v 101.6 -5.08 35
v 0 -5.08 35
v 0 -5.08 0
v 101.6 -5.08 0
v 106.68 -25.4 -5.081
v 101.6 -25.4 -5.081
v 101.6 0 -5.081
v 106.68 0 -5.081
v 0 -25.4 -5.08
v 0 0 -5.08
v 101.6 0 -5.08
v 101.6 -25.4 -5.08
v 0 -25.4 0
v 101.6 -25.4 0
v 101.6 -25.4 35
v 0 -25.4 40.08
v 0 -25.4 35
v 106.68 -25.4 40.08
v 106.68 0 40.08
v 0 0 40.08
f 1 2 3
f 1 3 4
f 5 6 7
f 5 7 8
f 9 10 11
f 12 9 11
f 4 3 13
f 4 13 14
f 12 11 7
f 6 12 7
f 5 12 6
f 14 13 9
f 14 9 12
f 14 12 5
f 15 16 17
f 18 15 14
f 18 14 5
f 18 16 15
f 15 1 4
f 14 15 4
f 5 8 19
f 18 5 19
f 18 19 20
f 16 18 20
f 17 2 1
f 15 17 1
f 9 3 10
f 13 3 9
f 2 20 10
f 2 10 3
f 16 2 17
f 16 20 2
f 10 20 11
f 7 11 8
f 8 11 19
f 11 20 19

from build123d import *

# Parameters (mm, degrees)
F0_W      = 101.6
F0_H      = 5.08
F1_DEPTH  = 25.4
F0_H_2    = 35
F2_DEPTH  = 5.08
F1_FACE_W = 25.4
F1_FACE_H = 45.1612
F3_DEPTH  = 5.08


with BuildPart() as f1:
    # F0 (on Front) → F1 (new body)
    with BuildSketch(Plane.XZ):
        Polygon((0, -5.08), (0, 0), (0, 35), (0, 40.08), (-5.08, 40.08), (-5.08, -5.0812), (0, -5.0812), align=None)
        with Locations((50.8, -2.54)):
            Rectangle(F0_W, F0_H)
        Polygon((101.6, 35), (101.6, 0), (101.6, -5.08), (101.6, -5.0812), (106.68, -5.0812), (106.68, 40.08), (101.6, 40.08), align=None)
        with Locations((50.8, 37.54)):
            Rectangle(F0_W, F0_H)
    extrude(amount=F1_DEPTH)

    # F0 (on Front) → F2 (join)
    with BuildSketch(Plane.XZ):
        with Locations((50.8, 17.5)):
            Rectangle(F0_W, F0_H_2)
    extrude(amount=F2_DEPTH)

    # F1_face (on face) → F3 (cut)
    with BuildSketch(Plane(origin=(-5.08, -12.7, 17.4994), x_dir=(0, -1, 0), z_dir=(-1, 0, 0))):
        Rectangle(F1_FACE_W, F1_FACE_H)
    extrude(amount=-F3_DEPTH, mode=Mode.SUBTRACT)


solid = f1.part
